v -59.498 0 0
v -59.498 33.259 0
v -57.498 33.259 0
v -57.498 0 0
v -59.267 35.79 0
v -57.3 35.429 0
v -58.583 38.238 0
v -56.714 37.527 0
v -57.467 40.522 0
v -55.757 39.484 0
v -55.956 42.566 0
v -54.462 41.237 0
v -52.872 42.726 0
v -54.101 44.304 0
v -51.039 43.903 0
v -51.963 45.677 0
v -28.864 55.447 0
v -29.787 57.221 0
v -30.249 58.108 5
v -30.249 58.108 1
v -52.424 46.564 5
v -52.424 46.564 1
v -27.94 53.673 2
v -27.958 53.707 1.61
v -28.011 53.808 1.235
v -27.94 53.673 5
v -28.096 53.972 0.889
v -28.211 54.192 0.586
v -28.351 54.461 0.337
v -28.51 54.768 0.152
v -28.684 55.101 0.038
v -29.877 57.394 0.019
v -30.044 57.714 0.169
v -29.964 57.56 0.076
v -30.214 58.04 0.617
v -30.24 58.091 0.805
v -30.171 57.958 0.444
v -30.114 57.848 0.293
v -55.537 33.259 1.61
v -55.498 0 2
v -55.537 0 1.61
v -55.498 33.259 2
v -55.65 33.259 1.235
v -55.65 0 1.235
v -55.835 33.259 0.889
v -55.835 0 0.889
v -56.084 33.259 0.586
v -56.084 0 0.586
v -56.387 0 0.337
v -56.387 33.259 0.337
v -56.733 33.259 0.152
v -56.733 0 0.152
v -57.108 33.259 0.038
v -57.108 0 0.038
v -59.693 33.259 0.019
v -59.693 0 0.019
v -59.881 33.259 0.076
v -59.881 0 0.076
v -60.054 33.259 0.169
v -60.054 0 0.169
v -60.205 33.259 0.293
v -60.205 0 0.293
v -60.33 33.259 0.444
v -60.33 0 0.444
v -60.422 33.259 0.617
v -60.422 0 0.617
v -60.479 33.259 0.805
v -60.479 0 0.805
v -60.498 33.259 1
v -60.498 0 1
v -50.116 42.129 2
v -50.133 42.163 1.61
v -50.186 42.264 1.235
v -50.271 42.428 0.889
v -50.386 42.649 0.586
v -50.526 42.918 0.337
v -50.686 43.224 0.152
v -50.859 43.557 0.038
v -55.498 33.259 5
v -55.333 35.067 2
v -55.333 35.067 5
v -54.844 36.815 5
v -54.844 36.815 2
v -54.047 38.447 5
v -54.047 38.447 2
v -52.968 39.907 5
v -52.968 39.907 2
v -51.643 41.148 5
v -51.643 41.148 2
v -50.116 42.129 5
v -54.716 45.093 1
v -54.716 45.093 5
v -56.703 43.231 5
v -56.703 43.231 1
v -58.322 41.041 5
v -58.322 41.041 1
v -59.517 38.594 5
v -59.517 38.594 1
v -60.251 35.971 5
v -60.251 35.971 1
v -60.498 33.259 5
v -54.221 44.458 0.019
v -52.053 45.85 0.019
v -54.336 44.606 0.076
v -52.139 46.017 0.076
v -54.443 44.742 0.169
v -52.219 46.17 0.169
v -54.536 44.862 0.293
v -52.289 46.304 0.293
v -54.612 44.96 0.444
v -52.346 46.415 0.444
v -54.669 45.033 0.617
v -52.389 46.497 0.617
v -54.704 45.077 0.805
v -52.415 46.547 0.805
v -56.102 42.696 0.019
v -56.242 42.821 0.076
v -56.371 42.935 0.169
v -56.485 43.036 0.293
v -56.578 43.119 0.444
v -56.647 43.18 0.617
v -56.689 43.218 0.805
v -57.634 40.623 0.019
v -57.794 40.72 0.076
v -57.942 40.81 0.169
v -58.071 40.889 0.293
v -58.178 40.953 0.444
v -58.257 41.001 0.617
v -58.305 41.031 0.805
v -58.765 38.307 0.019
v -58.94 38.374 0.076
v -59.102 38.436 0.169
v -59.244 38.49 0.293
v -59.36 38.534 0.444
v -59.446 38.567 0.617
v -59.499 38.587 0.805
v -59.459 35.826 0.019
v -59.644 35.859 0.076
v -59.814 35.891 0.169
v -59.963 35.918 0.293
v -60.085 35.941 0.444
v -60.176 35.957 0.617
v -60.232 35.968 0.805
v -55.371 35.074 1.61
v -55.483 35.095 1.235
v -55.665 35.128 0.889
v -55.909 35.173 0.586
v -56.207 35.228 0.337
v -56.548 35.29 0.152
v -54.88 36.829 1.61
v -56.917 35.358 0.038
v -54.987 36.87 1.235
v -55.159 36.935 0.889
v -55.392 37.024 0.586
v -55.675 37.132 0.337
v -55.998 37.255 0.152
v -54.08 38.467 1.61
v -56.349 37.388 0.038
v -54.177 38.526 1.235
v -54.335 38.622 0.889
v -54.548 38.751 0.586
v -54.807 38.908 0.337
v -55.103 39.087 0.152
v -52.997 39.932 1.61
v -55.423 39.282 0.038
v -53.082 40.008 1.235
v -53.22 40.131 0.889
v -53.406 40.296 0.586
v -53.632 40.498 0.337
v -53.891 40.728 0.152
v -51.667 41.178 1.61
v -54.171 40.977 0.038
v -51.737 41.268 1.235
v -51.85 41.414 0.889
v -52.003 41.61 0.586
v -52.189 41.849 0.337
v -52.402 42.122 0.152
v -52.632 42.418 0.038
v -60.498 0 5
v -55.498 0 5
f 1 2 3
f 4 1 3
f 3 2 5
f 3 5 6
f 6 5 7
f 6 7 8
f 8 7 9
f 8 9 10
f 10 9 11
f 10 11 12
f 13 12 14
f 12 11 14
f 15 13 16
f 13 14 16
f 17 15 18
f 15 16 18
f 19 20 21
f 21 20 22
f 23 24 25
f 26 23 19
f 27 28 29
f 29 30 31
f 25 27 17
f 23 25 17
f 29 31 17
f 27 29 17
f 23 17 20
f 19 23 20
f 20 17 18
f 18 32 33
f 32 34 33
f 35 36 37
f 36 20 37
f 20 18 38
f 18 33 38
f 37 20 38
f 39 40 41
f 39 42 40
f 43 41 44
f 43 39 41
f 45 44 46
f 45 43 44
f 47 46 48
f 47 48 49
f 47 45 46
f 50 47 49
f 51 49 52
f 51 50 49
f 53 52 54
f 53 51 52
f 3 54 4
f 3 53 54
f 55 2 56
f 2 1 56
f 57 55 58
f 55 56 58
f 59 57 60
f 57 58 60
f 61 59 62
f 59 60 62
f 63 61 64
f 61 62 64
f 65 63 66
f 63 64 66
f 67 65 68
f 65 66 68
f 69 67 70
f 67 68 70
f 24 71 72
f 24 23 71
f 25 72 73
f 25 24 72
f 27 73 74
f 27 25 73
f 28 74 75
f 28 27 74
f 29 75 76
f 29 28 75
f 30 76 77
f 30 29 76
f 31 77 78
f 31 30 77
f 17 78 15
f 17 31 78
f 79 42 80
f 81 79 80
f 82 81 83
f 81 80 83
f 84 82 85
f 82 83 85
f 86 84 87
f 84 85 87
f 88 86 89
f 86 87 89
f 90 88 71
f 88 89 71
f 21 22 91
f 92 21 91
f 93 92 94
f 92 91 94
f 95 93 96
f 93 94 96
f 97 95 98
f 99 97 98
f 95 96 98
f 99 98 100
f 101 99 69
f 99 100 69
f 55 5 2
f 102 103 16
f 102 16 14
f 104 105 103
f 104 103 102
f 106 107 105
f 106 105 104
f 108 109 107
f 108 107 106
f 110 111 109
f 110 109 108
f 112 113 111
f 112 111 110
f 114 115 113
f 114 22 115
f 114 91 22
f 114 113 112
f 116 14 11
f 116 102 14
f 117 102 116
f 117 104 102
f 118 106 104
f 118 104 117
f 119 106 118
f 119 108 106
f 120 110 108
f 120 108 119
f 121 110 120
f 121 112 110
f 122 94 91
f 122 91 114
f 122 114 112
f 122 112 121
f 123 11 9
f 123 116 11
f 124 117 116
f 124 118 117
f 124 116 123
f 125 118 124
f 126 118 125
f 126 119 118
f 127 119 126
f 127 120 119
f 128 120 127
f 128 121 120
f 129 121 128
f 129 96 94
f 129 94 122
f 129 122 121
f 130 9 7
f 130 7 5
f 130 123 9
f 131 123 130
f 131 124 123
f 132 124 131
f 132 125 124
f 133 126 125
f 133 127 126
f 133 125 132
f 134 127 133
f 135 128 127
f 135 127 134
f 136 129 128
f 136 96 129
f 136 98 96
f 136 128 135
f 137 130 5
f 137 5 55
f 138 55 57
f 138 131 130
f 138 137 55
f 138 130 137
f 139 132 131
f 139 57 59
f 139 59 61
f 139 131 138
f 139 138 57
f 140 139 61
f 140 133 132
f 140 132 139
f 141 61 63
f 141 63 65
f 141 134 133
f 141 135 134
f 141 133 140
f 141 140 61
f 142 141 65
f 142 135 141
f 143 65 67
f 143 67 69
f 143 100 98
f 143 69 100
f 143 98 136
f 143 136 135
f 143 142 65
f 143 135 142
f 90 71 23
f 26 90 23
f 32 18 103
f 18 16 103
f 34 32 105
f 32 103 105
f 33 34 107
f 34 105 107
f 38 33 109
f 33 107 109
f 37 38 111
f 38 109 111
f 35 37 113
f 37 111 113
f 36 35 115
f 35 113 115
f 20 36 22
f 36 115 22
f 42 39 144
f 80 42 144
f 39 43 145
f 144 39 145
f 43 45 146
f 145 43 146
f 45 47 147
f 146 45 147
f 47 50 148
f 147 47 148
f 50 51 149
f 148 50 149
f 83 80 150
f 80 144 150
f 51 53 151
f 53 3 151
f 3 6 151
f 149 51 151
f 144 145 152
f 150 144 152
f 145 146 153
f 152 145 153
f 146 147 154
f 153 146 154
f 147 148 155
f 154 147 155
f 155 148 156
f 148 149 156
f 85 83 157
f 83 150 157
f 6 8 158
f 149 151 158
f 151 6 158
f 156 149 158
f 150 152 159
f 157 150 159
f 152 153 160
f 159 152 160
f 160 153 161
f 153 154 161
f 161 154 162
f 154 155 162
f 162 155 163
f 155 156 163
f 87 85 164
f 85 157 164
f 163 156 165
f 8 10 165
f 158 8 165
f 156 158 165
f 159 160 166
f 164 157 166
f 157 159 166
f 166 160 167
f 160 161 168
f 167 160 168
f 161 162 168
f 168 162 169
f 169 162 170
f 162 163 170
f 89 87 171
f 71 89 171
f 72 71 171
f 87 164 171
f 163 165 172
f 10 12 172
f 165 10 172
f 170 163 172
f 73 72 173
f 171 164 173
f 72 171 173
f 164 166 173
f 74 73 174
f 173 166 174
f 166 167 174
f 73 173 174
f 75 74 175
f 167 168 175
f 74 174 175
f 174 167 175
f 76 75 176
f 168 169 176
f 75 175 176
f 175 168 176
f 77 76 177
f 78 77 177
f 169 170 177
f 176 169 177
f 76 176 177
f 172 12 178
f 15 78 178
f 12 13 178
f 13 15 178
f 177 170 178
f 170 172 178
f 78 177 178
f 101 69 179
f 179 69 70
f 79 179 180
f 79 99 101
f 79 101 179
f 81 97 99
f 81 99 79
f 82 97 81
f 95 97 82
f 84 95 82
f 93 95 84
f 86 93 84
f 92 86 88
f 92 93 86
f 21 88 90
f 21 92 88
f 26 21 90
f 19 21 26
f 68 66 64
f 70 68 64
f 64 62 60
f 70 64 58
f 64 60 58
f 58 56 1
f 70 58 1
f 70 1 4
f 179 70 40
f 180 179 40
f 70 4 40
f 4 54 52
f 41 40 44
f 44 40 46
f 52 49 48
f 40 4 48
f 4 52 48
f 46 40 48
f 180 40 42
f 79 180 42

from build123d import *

# Parameters (mm, degrees)
F1_DEPTH = 5
F2_R     = 2
F3_R     = 1


with BuildPart() as f1:
    # F0 (on Top) → F1 (new body)
    with BuildSketch(Plane.XY):
        with BuildLine():
            Line((-60.498083, 0), (-55.498083, 0))
            Line((-55.498083, 0), (-55.498083, 33.258991))
            ThreePointArc((-55.498083, 33.258991), (-54.047202, 38.446723), (-50.115569, 42.129099))
            Line((-50.115569, 42.129099), (-27.940299, 53.672814))
            Line((-27.940299, 53.672814), (-30.249042, 58.107868))
            Line((-30.249042, 58.107868), (-52.424312, 46.564153))
            ThreePointArc((-52.424312, 46.564153), (-58.321761, 41.040589), (-60.498083, 33.258991))
            Line((-60.498083, 33.258991), (-60.498083, 0))
        make_face()
    extrude(amount=F1_DEPTH)

    # F2
    f2_edges = [f1.edges().sort_by_distance(p)[0] for p in [
        (-55.498083, 16.629495, 0),
    ]]
    fillet(f2_edges, radius=F2_R)

    # F3
    f3_edges = [f1.edges().sort_by_distance(p)[0] for p in [
        (-60.498083, 16.629495, 0),
    ]]
    fillet(f3_edges, radius=F3_R)


solid = f1.part
